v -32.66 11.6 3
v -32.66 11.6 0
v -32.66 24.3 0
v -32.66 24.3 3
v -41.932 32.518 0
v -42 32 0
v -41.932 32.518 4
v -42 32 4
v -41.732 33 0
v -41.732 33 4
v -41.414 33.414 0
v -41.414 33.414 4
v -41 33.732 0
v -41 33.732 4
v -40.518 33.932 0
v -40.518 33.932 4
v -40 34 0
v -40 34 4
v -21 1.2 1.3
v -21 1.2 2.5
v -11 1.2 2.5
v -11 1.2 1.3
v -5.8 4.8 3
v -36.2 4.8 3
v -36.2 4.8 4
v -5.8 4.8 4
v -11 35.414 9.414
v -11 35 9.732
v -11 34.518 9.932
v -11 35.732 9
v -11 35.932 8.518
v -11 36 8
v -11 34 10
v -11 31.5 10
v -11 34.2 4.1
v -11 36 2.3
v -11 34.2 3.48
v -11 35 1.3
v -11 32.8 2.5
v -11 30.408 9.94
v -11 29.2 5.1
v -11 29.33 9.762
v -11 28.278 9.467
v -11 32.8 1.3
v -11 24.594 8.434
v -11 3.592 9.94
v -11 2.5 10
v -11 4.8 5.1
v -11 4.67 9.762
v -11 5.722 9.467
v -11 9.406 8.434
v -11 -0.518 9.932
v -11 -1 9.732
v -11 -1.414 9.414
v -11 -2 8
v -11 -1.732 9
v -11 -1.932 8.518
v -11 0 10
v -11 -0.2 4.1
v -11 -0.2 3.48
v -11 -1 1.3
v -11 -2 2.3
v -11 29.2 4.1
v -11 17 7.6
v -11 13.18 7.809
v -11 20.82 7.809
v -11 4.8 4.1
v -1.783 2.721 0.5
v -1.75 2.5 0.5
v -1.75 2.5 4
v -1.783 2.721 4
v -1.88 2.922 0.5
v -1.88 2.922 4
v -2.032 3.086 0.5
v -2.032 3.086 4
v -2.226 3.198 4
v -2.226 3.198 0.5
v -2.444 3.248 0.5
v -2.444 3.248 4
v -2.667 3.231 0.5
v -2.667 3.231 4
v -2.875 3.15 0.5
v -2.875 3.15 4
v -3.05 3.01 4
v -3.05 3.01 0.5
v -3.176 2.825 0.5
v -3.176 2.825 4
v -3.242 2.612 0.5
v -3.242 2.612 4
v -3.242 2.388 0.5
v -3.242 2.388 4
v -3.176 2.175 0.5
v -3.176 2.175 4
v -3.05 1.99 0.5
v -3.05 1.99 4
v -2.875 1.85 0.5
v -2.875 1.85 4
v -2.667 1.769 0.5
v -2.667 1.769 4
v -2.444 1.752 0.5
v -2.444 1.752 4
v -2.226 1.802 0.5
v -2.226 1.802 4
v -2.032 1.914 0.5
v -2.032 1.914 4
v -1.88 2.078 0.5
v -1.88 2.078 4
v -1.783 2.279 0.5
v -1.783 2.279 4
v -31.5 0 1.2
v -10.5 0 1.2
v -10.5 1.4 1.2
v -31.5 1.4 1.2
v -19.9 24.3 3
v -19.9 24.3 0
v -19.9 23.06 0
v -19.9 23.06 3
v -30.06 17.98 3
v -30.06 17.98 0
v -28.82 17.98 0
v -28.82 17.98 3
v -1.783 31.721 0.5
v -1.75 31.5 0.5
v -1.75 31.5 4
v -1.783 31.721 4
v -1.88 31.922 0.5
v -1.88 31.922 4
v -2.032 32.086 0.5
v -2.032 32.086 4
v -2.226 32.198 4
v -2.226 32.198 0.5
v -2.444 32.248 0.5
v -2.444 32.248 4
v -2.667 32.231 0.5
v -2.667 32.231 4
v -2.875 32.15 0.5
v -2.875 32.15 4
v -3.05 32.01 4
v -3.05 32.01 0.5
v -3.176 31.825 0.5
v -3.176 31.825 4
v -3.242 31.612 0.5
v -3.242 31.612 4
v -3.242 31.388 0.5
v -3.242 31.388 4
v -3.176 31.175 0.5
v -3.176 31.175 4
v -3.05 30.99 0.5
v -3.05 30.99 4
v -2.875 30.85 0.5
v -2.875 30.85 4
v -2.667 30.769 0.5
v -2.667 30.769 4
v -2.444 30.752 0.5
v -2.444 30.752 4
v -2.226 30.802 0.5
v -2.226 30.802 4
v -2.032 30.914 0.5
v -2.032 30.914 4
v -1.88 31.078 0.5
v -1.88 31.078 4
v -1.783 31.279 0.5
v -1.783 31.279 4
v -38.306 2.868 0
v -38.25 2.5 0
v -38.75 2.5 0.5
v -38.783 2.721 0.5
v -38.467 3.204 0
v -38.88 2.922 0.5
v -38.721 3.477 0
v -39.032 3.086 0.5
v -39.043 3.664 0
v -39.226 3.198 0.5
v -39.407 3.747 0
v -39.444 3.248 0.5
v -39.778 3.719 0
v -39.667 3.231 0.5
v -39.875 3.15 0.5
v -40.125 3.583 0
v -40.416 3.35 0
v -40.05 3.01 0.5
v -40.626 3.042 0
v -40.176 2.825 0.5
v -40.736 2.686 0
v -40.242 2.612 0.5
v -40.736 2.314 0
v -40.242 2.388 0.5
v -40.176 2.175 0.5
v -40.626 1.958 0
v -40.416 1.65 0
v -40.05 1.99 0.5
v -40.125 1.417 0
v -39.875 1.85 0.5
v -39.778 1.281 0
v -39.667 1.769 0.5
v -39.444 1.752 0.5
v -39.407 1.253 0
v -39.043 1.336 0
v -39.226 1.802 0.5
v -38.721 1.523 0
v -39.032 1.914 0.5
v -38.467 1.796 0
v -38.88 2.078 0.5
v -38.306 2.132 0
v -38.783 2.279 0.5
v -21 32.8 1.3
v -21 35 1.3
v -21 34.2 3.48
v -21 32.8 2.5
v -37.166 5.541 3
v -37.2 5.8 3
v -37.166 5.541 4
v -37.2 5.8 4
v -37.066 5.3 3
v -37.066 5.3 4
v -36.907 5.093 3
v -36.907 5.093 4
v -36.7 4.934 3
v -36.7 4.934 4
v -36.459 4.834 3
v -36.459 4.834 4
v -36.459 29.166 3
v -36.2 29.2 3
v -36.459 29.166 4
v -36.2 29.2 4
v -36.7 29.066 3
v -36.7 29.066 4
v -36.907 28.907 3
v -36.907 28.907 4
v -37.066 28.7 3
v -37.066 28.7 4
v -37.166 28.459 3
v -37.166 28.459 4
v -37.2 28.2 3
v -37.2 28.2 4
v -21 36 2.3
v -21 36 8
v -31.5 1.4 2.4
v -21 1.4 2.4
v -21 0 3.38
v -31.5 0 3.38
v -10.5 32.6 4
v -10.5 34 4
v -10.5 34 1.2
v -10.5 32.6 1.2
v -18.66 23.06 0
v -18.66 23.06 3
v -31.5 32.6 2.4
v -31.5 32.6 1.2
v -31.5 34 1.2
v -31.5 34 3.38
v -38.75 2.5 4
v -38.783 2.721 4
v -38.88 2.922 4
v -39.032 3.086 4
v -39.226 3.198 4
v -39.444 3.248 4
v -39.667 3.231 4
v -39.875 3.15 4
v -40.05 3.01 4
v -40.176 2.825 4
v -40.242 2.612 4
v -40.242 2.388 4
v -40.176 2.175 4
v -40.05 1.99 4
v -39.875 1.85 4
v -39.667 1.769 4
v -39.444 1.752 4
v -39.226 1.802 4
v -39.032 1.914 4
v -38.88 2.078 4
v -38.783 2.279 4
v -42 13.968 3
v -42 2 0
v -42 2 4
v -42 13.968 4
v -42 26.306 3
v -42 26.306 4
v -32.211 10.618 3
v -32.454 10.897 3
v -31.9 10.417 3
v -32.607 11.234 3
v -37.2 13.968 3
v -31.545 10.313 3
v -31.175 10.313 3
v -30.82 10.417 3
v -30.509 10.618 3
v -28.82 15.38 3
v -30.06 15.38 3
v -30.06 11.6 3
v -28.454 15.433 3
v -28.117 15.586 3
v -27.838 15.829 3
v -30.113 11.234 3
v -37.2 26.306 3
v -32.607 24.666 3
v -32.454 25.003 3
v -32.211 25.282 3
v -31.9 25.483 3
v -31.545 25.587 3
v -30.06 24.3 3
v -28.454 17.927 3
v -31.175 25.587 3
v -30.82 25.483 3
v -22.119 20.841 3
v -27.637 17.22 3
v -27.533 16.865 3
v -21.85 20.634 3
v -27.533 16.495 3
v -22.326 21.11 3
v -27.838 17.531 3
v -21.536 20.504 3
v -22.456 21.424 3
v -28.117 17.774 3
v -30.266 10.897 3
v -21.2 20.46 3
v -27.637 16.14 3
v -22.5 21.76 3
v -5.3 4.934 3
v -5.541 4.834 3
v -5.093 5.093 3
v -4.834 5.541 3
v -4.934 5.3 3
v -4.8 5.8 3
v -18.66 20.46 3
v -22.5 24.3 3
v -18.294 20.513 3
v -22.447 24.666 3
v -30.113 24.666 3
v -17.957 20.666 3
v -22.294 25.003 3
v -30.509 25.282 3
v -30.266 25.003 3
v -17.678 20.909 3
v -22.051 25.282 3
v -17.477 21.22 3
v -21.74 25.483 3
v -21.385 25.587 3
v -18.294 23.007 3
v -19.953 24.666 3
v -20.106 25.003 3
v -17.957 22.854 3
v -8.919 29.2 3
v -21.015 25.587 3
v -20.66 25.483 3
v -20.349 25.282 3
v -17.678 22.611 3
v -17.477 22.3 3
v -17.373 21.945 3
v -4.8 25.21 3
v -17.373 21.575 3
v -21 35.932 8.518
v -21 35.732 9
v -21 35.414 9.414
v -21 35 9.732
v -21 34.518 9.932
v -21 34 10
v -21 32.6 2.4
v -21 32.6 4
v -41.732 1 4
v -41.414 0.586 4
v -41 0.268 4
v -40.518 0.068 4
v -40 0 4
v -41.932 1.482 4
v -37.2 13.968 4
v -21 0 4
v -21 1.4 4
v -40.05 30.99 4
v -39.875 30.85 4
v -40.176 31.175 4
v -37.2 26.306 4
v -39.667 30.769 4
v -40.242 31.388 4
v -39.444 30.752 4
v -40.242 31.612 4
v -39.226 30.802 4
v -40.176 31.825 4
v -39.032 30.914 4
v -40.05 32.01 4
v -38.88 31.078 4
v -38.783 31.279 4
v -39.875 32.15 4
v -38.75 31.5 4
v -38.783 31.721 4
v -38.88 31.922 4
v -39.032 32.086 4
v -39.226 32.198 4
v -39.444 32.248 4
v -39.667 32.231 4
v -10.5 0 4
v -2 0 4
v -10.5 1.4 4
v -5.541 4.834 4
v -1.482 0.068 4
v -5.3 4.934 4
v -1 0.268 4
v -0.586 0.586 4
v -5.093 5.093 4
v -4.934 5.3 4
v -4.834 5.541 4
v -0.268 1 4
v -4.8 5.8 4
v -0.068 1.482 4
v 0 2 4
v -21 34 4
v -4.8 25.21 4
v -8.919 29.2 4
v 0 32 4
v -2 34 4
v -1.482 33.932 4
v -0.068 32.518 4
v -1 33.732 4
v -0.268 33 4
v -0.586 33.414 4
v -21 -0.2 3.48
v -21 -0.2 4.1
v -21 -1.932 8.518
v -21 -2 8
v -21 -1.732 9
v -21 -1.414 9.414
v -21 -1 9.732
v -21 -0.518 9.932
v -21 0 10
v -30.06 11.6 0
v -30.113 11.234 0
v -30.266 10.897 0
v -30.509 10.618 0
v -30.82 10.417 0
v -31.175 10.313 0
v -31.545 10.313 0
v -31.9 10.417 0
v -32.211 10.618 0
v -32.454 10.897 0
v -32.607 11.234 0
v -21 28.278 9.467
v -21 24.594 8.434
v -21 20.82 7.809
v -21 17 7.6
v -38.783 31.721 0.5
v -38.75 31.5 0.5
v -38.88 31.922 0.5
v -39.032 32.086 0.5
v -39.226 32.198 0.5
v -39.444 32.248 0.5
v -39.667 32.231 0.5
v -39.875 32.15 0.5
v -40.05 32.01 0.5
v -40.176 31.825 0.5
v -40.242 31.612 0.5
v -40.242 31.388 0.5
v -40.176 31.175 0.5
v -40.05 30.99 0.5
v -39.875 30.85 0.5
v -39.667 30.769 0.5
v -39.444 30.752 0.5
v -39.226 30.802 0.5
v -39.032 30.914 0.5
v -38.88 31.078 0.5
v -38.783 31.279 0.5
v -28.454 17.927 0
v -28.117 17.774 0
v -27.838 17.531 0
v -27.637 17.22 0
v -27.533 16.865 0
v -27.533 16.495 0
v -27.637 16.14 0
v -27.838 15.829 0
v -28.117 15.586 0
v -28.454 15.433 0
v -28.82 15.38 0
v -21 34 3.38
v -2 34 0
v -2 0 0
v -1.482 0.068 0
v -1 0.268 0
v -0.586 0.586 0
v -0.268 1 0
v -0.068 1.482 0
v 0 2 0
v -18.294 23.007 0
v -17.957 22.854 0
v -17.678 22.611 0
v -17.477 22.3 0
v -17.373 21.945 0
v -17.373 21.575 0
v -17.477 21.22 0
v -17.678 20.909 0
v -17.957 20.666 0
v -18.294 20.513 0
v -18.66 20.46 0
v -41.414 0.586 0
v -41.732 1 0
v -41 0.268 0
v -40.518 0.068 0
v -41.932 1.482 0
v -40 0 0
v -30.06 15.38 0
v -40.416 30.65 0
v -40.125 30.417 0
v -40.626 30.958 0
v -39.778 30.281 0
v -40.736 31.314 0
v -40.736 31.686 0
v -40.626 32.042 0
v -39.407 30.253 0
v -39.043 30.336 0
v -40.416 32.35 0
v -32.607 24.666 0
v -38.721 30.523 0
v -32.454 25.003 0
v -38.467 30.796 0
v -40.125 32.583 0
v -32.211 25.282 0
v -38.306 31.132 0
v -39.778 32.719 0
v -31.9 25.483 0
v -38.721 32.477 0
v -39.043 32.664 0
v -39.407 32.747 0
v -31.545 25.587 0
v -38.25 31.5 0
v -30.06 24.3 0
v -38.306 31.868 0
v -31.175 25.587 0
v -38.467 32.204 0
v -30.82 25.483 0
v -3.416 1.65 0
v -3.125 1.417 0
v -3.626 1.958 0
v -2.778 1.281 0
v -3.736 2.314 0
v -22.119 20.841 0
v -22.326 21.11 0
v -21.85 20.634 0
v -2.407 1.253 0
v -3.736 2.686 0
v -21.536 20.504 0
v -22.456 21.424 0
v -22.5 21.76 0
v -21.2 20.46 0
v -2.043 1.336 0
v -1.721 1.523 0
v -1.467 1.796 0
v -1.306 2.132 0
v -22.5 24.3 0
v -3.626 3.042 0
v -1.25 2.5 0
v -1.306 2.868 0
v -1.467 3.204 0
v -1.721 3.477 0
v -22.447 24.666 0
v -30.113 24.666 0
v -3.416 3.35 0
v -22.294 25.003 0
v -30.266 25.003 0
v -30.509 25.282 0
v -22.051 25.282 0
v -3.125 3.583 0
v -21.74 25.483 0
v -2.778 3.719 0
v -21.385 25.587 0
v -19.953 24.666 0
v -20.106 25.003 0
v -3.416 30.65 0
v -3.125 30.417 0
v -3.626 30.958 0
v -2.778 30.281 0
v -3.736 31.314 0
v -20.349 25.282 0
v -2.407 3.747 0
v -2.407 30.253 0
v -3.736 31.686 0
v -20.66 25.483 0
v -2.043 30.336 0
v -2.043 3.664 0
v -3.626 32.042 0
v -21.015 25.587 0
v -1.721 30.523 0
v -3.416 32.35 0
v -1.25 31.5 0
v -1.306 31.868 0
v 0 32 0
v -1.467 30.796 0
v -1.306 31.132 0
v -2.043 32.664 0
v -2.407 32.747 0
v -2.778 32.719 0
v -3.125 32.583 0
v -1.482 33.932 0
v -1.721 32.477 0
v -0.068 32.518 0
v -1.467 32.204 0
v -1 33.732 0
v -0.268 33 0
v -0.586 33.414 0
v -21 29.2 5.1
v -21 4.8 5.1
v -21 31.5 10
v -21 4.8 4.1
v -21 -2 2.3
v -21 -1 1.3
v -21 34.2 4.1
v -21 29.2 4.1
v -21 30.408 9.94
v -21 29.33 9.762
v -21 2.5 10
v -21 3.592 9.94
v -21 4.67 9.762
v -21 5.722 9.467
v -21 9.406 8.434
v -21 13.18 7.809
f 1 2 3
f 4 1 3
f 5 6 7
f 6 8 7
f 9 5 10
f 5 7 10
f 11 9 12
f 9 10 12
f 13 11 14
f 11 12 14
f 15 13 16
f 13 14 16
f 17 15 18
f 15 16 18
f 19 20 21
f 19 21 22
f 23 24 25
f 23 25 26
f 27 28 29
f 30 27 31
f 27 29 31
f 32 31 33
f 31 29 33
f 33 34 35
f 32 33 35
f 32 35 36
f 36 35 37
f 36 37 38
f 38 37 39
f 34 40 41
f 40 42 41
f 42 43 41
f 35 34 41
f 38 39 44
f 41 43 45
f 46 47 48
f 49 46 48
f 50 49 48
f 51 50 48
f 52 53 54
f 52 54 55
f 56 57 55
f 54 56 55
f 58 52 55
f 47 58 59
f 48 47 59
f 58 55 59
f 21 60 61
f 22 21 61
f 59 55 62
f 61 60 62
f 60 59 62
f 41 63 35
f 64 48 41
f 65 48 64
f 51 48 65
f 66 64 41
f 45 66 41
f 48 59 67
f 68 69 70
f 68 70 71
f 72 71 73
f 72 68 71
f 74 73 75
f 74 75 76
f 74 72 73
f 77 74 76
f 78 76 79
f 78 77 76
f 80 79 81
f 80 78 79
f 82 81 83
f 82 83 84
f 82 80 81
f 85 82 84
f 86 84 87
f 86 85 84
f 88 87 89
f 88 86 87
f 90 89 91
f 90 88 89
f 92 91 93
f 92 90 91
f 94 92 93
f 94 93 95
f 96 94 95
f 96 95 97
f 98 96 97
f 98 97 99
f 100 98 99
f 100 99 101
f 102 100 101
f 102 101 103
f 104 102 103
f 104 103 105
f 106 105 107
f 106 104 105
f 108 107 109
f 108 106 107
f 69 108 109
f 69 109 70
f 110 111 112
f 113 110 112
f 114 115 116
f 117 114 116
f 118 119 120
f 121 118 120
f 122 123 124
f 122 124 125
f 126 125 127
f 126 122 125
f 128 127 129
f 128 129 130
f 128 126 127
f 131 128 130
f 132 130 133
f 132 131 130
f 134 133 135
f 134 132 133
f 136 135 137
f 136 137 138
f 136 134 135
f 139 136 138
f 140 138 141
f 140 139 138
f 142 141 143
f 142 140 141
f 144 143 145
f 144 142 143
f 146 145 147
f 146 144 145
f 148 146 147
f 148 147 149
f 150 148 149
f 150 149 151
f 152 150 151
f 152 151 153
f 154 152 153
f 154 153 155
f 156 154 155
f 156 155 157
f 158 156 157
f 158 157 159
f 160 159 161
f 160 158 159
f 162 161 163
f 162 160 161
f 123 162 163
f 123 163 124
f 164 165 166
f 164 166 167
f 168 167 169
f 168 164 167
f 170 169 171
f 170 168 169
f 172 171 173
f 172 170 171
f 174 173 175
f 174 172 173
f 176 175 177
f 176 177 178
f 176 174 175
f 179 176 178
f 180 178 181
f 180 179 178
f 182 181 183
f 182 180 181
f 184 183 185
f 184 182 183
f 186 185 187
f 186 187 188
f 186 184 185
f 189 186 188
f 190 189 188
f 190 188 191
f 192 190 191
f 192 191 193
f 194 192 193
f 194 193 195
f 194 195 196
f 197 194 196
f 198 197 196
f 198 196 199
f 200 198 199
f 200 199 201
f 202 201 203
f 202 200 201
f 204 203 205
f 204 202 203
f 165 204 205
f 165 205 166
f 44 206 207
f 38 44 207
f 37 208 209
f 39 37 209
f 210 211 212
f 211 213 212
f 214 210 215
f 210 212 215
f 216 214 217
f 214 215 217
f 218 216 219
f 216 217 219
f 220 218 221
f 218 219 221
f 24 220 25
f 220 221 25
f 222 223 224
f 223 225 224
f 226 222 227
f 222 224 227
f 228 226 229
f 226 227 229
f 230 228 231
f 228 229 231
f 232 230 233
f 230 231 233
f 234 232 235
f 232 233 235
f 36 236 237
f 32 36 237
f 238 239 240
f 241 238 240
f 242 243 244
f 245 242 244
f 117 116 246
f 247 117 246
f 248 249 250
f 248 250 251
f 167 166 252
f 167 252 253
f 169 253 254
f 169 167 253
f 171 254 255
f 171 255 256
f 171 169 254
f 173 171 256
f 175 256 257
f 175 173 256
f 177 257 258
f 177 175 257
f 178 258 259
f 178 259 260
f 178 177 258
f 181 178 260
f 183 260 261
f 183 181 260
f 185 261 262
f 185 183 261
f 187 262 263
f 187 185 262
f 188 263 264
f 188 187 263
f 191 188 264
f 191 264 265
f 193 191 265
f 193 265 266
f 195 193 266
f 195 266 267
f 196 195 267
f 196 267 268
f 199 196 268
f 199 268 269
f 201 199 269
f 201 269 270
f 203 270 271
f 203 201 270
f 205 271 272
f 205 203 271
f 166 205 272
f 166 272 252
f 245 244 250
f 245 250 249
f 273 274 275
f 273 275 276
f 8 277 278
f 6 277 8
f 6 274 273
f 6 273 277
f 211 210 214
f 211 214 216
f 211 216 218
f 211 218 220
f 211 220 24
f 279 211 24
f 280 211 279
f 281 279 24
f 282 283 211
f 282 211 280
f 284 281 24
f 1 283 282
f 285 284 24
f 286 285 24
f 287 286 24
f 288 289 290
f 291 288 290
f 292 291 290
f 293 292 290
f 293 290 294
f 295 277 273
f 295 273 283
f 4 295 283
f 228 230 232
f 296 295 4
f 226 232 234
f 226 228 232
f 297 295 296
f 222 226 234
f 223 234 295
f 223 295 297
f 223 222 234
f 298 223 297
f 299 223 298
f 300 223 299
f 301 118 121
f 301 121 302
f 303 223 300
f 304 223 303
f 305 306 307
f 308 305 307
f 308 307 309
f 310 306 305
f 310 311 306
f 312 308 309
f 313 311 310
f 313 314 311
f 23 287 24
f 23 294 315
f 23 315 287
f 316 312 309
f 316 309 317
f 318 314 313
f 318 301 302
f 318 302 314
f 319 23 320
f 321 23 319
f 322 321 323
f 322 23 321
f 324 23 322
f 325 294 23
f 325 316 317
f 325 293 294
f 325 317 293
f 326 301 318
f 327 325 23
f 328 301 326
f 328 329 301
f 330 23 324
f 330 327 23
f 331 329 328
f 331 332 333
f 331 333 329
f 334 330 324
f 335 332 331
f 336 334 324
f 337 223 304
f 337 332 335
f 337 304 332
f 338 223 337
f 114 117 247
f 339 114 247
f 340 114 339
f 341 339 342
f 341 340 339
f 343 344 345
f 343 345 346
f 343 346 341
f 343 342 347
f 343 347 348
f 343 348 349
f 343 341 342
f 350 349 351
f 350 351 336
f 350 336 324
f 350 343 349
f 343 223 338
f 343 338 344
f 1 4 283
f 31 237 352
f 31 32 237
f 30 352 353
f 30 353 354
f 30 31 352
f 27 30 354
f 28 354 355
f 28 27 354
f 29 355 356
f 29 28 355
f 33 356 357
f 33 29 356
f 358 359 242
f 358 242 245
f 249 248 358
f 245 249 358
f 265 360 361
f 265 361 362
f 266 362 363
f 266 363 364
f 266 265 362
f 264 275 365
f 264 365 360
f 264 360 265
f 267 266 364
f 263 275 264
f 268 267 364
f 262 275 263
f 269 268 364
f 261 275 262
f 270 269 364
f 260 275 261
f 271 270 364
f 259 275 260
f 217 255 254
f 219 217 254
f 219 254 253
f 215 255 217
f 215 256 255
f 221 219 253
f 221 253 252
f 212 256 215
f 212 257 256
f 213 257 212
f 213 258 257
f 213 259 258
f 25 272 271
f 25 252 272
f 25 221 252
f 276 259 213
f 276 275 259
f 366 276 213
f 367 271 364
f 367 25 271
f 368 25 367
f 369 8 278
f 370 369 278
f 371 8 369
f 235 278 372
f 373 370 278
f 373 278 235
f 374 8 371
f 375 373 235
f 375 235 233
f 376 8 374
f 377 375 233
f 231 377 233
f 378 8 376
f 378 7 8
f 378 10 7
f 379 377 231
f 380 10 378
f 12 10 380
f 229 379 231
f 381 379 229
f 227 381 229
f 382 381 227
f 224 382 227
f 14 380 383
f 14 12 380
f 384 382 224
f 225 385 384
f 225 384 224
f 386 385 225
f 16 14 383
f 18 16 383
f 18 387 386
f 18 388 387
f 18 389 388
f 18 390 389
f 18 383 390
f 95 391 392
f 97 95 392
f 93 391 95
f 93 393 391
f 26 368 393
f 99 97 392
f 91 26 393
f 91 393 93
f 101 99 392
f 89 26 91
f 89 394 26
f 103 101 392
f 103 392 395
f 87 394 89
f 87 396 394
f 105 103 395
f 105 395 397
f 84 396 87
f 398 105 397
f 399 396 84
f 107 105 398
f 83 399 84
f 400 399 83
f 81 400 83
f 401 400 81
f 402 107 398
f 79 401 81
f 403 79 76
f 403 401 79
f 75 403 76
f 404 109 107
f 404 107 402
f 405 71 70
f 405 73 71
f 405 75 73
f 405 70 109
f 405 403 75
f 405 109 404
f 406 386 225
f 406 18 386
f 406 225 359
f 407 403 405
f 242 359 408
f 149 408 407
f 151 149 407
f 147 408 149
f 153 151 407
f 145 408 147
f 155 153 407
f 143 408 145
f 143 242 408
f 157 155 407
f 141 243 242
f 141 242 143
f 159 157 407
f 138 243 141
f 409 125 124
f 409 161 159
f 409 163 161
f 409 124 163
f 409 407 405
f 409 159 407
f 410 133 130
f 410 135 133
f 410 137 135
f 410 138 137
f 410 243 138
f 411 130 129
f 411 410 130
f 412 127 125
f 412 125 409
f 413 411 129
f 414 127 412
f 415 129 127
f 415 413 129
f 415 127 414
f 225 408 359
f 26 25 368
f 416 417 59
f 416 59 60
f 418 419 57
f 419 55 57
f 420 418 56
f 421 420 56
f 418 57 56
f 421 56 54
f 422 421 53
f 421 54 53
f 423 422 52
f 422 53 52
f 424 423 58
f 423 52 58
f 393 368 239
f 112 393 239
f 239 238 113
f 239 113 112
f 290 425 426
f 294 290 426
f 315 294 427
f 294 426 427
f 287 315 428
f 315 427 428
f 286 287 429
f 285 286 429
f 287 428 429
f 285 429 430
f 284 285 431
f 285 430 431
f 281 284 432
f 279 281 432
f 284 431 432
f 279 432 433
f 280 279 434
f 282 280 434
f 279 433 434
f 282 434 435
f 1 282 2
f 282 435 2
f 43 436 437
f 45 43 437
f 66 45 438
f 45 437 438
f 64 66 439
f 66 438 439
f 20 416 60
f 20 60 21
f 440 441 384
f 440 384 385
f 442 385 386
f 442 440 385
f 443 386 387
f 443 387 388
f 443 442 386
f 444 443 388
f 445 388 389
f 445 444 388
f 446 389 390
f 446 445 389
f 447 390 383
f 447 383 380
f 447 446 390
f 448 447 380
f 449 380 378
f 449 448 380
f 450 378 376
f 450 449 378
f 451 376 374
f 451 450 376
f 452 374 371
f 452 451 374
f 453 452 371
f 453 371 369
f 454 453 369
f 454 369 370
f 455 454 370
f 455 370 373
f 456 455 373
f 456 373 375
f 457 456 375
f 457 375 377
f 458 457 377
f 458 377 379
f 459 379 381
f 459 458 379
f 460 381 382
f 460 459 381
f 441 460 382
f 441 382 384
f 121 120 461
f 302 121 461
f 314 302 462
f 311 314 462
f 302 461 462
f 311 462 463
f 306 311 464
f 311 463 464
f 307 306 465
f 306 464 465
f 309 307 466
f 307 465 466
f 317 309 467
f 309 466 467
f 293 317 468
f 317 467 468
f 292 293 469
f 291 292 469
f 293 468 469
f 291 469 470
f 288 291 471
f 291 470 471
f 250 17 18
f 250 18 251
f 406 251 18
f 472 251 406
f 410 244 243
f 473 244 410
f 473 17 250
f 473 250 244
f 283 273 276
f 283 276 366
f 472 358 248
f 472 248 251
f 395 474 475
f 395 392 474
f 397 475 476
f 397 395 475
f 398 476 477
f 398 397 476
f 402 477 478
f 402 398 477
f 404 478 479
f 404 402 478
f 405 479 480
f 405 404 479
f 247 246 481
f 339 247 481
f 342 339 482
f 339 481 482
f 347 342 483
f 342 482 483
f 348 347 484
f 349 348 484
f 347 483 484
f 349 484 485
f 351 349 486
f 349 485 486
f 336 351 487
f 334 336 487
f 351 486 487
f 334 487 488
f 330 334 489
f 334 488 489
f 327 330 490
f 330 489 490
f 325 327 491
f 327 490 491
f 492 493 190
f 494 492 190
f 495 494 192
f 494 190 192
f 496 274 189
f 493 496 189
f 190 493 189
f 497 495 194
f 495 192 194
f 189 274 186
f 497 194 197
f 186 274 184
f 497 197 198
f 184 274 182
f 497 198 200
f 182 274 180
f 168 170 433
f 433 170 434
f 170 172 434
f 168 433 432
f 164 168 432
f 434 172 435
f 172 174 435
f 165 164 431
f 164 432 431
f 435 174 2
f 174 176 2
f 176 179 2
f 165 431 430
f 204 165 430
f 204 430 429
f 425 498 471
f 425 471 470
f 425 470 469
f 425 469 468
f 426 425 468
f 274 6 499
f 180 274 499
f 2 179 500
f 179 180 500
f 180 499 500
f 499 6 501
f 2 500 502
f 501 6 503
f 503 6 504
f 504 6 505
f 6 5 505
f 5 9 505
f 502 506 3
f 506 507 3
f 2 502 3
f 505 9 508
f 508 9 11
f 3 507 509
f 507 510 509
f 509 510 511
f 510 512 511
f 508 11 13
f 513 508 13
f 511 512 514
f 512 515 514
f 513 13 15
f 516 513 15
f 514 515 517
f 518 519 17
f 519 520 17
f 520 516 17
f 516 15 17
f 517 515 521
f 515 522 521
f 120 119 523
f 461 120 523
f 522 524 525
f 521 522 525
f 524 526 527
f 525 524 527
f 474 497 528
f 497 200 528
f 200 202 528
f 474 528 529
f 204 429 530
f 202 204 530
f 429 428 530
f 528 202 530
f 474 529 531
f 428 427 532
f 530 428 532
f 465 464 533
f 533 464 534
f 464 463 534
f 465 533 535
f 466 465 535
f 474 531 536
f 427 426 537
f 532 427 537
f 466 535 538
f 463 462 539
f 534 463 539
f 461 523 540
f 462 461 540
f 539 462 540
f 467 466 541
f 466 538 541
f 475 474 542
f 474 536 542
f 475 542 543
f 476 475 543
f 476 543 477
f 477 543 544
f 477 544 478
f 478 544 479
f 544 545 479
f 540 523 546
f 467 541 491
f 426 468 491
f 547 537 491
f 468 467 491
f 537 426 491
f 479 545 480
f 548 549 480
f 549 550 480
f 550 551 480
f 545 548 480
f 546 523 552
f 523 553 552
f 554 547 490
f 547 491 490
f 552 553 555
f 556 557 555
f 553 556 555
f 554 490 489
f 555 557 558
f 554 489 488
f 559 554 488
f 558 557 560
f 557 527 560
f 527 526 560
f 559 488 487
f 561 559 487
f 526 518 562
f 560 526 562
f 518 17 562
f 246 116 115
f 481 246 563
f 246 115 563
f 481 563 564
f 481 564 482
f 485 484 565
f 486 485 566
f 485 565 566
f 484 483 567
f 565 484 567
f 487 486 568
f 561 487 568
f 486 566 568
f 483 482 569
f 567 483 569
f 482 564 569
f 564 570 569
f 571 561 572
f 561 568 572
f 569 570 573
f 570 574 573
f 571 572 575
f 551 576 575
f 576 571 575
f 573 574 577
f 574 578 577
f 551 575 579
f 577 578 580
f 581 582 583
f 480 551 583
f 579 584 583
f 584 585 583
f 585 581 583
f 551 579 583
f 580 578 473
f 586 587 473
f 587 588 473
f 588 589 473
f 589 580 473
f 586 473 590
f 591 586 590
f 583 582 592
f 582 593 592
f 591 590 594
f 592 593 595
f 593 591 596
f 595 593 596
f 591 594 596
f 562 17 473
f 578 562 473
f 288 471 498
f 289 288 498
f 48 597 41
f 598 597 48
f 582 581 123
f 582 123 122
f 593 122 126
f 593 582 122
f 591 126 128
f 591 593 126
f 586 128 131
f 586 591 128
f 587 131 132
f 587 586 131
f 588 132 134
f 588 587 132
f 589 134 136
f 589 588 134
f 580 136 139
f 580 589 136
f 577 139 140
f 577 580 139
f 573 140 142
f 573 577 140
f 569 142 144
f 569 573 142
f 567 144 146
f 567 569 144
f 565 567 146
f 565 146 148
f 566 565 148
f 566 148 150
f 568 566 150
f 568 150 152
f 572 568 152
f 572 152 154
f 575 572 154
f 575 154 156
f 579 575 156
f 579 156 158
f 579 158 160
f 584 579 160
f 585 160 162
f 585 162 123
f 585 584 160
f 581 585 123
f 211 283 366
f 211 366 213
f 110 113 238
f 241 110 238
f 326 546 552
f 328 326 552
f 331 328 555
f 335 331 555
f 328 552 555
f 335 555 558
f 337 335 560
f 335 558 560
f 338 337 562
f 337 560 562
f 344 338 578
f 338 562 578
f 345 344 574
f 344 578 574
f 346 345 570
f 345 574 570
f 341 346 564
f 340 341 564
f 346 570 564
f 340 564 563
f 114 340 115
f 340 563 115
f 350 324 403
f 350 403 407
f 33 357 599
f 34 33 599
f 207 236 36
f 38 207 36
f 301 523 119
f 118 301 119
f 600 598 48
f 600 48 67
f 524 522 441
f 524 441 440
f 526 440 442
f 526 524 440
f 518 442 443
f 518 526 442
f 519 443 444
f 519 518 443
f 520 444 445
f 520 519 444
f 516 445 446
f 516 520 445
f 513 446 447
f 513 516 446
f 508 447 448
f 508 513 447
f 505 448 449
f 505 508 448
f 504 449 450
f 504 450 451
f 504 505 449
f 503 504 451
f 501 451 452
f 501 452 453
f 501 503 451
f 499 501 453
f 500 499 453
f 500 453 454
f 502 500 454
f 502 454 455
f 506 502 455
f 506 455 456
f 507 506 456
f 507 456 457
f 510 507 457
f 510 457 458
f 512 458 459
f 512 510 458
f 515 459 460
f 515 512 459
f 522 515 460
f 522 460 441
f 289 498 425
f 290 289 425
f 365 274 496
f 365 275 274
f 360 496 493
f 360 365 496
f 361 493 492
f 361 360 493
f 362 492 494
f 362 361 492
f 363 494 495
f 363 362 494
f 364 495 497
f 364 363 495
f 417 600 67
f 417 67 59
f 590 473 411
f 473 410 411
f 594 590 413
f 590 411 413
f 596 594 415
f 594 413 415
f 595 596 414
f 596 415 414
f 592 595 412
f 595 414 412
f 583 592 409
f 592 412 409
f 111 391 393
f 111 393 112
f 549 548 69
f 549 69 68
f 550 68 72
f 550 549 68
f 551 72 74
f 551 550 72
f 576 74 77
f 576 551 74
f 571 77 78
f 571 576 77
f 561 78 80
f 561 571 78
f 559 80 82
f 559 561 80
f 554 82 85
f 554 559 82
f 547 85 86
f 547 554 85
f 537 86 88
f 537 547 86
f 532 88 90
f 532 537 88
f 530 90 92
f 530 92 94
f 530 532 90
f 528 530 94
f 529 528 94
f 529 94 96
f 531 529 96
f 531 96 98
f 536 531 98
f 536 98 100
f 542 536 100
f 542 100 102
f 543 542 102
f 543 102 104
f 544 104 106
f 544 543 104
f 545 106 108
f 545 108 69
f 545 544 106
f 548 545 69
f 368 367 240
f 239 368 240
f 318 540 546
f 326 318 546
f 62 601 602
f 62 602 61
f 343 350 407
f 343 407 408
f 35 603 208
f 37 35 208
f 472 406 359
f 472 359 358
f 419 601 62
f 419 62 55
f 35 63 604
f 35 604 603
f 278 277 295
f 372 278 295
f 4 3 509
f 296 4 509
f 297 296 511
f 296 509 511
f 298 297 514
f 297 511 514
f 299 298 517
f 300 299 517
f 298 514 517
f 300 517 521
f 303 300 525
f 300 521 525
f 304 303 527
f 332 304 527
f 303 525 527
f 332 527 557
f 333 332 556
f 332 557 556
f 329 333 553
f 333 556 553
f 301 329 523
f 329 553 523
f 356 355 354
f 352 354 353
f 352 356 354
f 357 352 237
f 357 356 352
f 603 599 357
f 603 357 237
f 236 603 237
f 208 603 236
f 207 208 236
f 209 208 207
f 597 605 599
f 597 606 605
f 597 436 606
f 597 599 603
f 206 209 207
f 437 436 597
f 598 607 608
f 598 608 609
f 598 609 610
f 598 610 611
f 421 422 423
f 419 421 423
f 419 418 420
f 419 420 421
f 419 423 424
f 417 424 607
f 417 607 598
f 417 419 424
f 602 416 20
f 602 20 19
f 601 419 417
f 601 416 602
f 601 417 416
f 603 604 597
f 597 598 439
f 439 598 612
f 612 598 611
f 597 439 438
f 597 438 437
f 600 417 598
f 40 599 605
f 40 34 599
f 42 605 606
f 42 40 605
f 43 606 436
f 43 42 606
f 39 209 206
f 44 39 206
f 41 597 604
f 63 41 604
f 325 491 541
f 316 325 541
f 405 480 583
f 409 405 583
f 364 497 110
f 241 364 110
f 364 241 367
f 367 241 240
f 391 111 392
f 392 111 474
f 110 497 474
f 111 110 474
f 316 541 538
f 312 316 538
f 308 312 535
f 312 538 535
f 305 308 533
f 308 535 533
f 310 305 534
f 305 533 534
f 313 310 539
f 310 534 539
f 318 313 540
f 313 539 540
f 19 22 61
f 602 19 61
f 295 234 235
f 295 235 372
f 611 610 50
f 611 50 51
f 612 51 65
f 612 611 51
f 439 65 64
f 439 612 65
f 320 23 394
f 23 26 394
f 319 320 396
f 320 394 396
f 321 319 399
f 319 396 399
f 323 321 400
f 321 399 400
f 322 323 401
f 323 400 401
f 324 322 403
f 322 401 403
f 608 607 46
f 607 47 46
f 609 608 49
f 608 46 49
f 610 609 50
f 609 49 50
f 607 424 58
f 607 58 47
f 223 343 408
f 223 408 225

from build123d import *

# Parameters (mm, degrees)
SKIZZE1_W                       = 42
SKIZZE1_H                       = 34
SKIZZE1_R                       = 0.75
AUFSATZ_LINEAR_AUSTRAGEN1_DEPTH = 4
SCHNITT_LINEAR_AUSTRAGEN1_DEPTH = 55.120236511
SCHNITT_LINEAR_AUSTRAGEN2_DEPTH = 55.184868737
SCHNITT_LINEAR_AUSTRAGEN4_DEPTH = 55.184868737
SKIZZE4_W                       = 5.186319123
SKIZZE4_H                       = 12.338044151
SCHNITT_LINEAR_AUSTRAGEN3_DEPTH = 55.120236511
VERRUNDUNG1_R                   = 2
VERRUNDUNG2_R                   = 1
FASE2_SIZE                      = 0.5
SCHNITT_LINEAR_AUSTRAGEN8_DEPTH = 10.5
SKIZZE15_W                      = 4.03797119
SKIZZE15_H                      = 1.639176424
SCHNITT_LINEAR_AUSTRAGEN9_DEPTH = 10.5
AUFSATZ_LINEAR_AUSTRAGEN5_DEPTH = 10
FASE4_SIZE                      = 1
VERRUNDUNG10_R                  = 2
VERRUNDUNG11_R                  = 10


with BuildPart() as part:
    # Skizze1 → Aufsatz-Linear austragen1 (new body)
    with BuildSketch(Plane.XY):
        with Locations((-21, 17)):
            Rectangle(SKIZZE1_W, SKIZZE1_H)
        with Locations((-39.5, 31.5)):
            Circle(SKIZZE1_R, mode=Mode.SUBTRACT)
        with Locations((-2.5, 31.5)):
            Circle(SKIZZE1_R, mode=Mode.SUBTRACT)
        with Locations((-39.5, 2.5)):
            Circle(SKIZZE1_R, mode=Mode.SUBTRACT)
        with Locations((-2.5, 2.5)):
            Circle(SKIZZE1_R, mode=Mode.SUBTRACT)
    extrude(amount=AUFSATZ_LINEAR_AUSTRAGEN1_DEPTH)

    # Skizze2 → Schnitt-Linear austragen1 (cut, through all)
    with BuildSketch(Plane.XY.offset(3)):
        Polygon((-37.2, 29.2), (-37.2, 4.8), (-4.8, 4.8), (-4.8, 25.209708368), (-8.919010717, 29.2), align=None)
    extrude(amount=SCHNITT_LINEAR_AUSTRAGEN1_DEPTH, mode=Mode.SUBTRACT)

    # Skizze3 → Schnitt-Linear austragen2 (cut, through all)
    with BuildSketch(Plane.XY):
        with BuildLine():
            Line((-30.06, 24.3), (-30.06, 11.6))
            ThreePointArc((-30.06, 11.6), (-31.36, 10.3), (-32.66, 11.6))
            Line((-32.66, 11.6), (-32.66, 24.3))
            ThreePointArc((-32.66, 24.3), (-31.36, 25.6), (-30.06, 24.3))
        make_face()
        with BuildLine():
            Line((-19.9, 24.3), (-19.9, 21.76))
            ThreePointArc((-19.9, 21.76), (-21.2, 20.46), (-22.5, 21.76))
            Line((-22.5, 21.76), (-22.5, 24.3))
            ThreePointArc((-22.5, 24.3), (-21.2, 25.6), (-19.9, 24.3))
        make_face()
    extrude(amount=SCHNITT_LINEAR_AUSTRAGEN2_DEPTH, mode=Mode.SUBTRACT)

    # Skizze5 → Schnitt-Linear austragen4 (cut, through all)
    with BuildSketch(Plane.XY):
        with BuildLine():
            Line((-28.82, 15.38), (-31.36, 15.38))
            ThreePointArc((-31.36, 15.38), (-32.66, 16.68), (-31.36, 17.98))
            Line((-31.36, 17.98), (-28.82, 17.98))
            ThreePointArc((-28.82, 17.98), (-27.52, 16.68), (-28.82, 15.38))
        make_face()
        with BuildLine():
            Line((-18.66, 20.46), (-21.2, 20.46))
            ThreePointArc((-21.2, 20.46), (-22.5, 21.76), (-21.2, 23.06))
            Line((-21.2, 23.06), (-18.66, 23.06))
            ThreePointArc((-18.66, 23.06), (-17.36, 21.76), (-18.66, 20.46))
        make_face()
    extrude(amount=SCHNITT_LINEAR_AUSTRAGEN4_DEPTH, mode=Mode.SUBTRACT)

    # Skizze4 → Schnitt-Linear austragen3 (cut, through all)
    with BuildSketch(Plane.XY.offset(3)):
        with Locations((-39.793159562, 20.13653497)):
            Rectangle(SKIZZE4_W, SKIZZE4_H)
    extrude(amount=SCHNITT_LINEAR_AUSTRAGEN3_DEPTH, mode=Mode.SUBTRACT)

    # Verrundung1
    verrundung1_edges = [part.edges().sort_by_distance(p)[0] for p in [
        (0, 0, 2),
        (-42, 0, 2),
        (-42, 34, 2),
        (0, 34, 2),
    ]]
    fillet(verrundung1_edges, radius=VERRUNDUNG1_R)

    # Verrundung2
    verrundung2_edges = [part.edges().sort_by_distance(p)[0] for p in [
        (-37.2, 29.2, 3.5),
        (-37.2, 4.8, 3.5),
        (-4.8, 4.8, 3.5),
    ]]
    fillet(verrundung2_edges, radius=VERRUNDUNG2_R)

    # Fase2
    fase2_edges = [part.edges().sort_by_distance(p)[0] for p in [
        (-40.25, 31.5, 0),
        (-3.25, 31.5, 0),
        (-40.25, 2.5, 0),
        (-3.25, 2.5, 0),
    ]]
    chamfer(fase2_edges, length=FASE2_SIZE)

    # Skizze14 → Schnitt-Linear austragen8 (cut, symmetric)
    with BuildSketch(Plane(origin=(-21, 0, 0), x_dir=(0, 0, -1), z_dir=(1, 0, 0))):
        Polygon((-3.380290553, 34), (-1.2, 34), (-1.2, 32.6), (-2.4, 32.6), align=None)
    schnitt_linear_austragen8 = extrude(amount=SCHNITT_LINEAR_AUSTRAGEN8_DEPTH, both=True, mode=Mode.SUBTRACT)

    # Skizze15 → Schnitt-Linear austragen9 (cut)
    with BuildSketch(Plane(origin=(-21, 0, 0), x_dir=(0, 0, -1), z_dir=(1, 0, 0))):
        with Locations((-3.218985595, 33.419588212)):
            Rectangle(SKIZZE15_W, SKIZZE15_H)
    schnitt_linear_austragen9 = extrude(amount=SCHNITT_LINEAR_AUSTRAGEN9_DEPTH, mode=Mode.SUBTRACT)

    # Spiegeln2: Schnitt-Linear austragen8, Schnitt-Linear austragen9 across plane
    add(schnitt_linear_austragen8.mirror(Plane.ZX.offset(17)), mode=Mode.SUBTRACT)
    add(schnitt_linear_austragen9.mirror(Plane.ZX.offset(17)), mode=Mode.SUBTRACT)


with BuildPart() as body_2:
    # Skizze16 → Aufsatz-Linear austragen5 (new body)
    with BuildSketch(Plane(origin=(-21, 0, 0), x_dir=(0, 0, -1), z_dir=(1, 0, 0))):
        with BuildLine():
            Line((-4.1, 34.2), (-3.480290553, 34.2))
            Line((-3.480290553, 34.2), (-2.5, 32.8))
            Line((-2.5, 32.8), (-1.3, 32.8))
            Line((-1.3, 32.8), (-1.3, 36))
            Line((-1.3, 36), (-10, 36))
            Line((-10, 36), (-10, 29.737346662))
            ThreePointArc((-10, 29.737346662), (-8.205232956, 23.480740698), (-7.6, 17))
            Line((-7.6, 17), (-5.1, 17))
            Line((-5.1, 17), (-5.1, 29.2))
            Line((-5.1, 29.2), (-4.1, 29.2))
            Line((-4.1, 29.2), (-4.1, 34.2))
        make_face()
    extrude(amount=AUFSATZ_LINEAR_AUSTRAGEN5_DEPTH)

    # Fase4
    fase4_edges = [body_2.edges().sort_by_distance(p)[0] for p in [
        (-16, 36, 1.3),
    ]]
    chamfer(fase4_edges, length=FASE4_SIZE)

    # Verrundung10
    verrundung10_edges = [body_2.edges().sort_by_distance(p)[0] for p in [
        (-16, 36, 10),
    ]]
    fillet(verrundung10_edges, radius=VERRUNDUNG10_R)

    # Verrundung11
    verrundung11_edges = [body_2.edges().sort_by_distance(p)[0] for p in [
        (-16, 29.737346662, 10),
    ]]
    fillet(verrundung11_edges, radius=VERRUNDUNG11_R)

    # Spiegeln3: body 2 across plane


with BuildPart() as body_2_1:
    add(body_2.part)
    add(body_2.part.mirror(Plane.ZX.offset(17)))


solid = Compound([part.part, body_2_1.part])
